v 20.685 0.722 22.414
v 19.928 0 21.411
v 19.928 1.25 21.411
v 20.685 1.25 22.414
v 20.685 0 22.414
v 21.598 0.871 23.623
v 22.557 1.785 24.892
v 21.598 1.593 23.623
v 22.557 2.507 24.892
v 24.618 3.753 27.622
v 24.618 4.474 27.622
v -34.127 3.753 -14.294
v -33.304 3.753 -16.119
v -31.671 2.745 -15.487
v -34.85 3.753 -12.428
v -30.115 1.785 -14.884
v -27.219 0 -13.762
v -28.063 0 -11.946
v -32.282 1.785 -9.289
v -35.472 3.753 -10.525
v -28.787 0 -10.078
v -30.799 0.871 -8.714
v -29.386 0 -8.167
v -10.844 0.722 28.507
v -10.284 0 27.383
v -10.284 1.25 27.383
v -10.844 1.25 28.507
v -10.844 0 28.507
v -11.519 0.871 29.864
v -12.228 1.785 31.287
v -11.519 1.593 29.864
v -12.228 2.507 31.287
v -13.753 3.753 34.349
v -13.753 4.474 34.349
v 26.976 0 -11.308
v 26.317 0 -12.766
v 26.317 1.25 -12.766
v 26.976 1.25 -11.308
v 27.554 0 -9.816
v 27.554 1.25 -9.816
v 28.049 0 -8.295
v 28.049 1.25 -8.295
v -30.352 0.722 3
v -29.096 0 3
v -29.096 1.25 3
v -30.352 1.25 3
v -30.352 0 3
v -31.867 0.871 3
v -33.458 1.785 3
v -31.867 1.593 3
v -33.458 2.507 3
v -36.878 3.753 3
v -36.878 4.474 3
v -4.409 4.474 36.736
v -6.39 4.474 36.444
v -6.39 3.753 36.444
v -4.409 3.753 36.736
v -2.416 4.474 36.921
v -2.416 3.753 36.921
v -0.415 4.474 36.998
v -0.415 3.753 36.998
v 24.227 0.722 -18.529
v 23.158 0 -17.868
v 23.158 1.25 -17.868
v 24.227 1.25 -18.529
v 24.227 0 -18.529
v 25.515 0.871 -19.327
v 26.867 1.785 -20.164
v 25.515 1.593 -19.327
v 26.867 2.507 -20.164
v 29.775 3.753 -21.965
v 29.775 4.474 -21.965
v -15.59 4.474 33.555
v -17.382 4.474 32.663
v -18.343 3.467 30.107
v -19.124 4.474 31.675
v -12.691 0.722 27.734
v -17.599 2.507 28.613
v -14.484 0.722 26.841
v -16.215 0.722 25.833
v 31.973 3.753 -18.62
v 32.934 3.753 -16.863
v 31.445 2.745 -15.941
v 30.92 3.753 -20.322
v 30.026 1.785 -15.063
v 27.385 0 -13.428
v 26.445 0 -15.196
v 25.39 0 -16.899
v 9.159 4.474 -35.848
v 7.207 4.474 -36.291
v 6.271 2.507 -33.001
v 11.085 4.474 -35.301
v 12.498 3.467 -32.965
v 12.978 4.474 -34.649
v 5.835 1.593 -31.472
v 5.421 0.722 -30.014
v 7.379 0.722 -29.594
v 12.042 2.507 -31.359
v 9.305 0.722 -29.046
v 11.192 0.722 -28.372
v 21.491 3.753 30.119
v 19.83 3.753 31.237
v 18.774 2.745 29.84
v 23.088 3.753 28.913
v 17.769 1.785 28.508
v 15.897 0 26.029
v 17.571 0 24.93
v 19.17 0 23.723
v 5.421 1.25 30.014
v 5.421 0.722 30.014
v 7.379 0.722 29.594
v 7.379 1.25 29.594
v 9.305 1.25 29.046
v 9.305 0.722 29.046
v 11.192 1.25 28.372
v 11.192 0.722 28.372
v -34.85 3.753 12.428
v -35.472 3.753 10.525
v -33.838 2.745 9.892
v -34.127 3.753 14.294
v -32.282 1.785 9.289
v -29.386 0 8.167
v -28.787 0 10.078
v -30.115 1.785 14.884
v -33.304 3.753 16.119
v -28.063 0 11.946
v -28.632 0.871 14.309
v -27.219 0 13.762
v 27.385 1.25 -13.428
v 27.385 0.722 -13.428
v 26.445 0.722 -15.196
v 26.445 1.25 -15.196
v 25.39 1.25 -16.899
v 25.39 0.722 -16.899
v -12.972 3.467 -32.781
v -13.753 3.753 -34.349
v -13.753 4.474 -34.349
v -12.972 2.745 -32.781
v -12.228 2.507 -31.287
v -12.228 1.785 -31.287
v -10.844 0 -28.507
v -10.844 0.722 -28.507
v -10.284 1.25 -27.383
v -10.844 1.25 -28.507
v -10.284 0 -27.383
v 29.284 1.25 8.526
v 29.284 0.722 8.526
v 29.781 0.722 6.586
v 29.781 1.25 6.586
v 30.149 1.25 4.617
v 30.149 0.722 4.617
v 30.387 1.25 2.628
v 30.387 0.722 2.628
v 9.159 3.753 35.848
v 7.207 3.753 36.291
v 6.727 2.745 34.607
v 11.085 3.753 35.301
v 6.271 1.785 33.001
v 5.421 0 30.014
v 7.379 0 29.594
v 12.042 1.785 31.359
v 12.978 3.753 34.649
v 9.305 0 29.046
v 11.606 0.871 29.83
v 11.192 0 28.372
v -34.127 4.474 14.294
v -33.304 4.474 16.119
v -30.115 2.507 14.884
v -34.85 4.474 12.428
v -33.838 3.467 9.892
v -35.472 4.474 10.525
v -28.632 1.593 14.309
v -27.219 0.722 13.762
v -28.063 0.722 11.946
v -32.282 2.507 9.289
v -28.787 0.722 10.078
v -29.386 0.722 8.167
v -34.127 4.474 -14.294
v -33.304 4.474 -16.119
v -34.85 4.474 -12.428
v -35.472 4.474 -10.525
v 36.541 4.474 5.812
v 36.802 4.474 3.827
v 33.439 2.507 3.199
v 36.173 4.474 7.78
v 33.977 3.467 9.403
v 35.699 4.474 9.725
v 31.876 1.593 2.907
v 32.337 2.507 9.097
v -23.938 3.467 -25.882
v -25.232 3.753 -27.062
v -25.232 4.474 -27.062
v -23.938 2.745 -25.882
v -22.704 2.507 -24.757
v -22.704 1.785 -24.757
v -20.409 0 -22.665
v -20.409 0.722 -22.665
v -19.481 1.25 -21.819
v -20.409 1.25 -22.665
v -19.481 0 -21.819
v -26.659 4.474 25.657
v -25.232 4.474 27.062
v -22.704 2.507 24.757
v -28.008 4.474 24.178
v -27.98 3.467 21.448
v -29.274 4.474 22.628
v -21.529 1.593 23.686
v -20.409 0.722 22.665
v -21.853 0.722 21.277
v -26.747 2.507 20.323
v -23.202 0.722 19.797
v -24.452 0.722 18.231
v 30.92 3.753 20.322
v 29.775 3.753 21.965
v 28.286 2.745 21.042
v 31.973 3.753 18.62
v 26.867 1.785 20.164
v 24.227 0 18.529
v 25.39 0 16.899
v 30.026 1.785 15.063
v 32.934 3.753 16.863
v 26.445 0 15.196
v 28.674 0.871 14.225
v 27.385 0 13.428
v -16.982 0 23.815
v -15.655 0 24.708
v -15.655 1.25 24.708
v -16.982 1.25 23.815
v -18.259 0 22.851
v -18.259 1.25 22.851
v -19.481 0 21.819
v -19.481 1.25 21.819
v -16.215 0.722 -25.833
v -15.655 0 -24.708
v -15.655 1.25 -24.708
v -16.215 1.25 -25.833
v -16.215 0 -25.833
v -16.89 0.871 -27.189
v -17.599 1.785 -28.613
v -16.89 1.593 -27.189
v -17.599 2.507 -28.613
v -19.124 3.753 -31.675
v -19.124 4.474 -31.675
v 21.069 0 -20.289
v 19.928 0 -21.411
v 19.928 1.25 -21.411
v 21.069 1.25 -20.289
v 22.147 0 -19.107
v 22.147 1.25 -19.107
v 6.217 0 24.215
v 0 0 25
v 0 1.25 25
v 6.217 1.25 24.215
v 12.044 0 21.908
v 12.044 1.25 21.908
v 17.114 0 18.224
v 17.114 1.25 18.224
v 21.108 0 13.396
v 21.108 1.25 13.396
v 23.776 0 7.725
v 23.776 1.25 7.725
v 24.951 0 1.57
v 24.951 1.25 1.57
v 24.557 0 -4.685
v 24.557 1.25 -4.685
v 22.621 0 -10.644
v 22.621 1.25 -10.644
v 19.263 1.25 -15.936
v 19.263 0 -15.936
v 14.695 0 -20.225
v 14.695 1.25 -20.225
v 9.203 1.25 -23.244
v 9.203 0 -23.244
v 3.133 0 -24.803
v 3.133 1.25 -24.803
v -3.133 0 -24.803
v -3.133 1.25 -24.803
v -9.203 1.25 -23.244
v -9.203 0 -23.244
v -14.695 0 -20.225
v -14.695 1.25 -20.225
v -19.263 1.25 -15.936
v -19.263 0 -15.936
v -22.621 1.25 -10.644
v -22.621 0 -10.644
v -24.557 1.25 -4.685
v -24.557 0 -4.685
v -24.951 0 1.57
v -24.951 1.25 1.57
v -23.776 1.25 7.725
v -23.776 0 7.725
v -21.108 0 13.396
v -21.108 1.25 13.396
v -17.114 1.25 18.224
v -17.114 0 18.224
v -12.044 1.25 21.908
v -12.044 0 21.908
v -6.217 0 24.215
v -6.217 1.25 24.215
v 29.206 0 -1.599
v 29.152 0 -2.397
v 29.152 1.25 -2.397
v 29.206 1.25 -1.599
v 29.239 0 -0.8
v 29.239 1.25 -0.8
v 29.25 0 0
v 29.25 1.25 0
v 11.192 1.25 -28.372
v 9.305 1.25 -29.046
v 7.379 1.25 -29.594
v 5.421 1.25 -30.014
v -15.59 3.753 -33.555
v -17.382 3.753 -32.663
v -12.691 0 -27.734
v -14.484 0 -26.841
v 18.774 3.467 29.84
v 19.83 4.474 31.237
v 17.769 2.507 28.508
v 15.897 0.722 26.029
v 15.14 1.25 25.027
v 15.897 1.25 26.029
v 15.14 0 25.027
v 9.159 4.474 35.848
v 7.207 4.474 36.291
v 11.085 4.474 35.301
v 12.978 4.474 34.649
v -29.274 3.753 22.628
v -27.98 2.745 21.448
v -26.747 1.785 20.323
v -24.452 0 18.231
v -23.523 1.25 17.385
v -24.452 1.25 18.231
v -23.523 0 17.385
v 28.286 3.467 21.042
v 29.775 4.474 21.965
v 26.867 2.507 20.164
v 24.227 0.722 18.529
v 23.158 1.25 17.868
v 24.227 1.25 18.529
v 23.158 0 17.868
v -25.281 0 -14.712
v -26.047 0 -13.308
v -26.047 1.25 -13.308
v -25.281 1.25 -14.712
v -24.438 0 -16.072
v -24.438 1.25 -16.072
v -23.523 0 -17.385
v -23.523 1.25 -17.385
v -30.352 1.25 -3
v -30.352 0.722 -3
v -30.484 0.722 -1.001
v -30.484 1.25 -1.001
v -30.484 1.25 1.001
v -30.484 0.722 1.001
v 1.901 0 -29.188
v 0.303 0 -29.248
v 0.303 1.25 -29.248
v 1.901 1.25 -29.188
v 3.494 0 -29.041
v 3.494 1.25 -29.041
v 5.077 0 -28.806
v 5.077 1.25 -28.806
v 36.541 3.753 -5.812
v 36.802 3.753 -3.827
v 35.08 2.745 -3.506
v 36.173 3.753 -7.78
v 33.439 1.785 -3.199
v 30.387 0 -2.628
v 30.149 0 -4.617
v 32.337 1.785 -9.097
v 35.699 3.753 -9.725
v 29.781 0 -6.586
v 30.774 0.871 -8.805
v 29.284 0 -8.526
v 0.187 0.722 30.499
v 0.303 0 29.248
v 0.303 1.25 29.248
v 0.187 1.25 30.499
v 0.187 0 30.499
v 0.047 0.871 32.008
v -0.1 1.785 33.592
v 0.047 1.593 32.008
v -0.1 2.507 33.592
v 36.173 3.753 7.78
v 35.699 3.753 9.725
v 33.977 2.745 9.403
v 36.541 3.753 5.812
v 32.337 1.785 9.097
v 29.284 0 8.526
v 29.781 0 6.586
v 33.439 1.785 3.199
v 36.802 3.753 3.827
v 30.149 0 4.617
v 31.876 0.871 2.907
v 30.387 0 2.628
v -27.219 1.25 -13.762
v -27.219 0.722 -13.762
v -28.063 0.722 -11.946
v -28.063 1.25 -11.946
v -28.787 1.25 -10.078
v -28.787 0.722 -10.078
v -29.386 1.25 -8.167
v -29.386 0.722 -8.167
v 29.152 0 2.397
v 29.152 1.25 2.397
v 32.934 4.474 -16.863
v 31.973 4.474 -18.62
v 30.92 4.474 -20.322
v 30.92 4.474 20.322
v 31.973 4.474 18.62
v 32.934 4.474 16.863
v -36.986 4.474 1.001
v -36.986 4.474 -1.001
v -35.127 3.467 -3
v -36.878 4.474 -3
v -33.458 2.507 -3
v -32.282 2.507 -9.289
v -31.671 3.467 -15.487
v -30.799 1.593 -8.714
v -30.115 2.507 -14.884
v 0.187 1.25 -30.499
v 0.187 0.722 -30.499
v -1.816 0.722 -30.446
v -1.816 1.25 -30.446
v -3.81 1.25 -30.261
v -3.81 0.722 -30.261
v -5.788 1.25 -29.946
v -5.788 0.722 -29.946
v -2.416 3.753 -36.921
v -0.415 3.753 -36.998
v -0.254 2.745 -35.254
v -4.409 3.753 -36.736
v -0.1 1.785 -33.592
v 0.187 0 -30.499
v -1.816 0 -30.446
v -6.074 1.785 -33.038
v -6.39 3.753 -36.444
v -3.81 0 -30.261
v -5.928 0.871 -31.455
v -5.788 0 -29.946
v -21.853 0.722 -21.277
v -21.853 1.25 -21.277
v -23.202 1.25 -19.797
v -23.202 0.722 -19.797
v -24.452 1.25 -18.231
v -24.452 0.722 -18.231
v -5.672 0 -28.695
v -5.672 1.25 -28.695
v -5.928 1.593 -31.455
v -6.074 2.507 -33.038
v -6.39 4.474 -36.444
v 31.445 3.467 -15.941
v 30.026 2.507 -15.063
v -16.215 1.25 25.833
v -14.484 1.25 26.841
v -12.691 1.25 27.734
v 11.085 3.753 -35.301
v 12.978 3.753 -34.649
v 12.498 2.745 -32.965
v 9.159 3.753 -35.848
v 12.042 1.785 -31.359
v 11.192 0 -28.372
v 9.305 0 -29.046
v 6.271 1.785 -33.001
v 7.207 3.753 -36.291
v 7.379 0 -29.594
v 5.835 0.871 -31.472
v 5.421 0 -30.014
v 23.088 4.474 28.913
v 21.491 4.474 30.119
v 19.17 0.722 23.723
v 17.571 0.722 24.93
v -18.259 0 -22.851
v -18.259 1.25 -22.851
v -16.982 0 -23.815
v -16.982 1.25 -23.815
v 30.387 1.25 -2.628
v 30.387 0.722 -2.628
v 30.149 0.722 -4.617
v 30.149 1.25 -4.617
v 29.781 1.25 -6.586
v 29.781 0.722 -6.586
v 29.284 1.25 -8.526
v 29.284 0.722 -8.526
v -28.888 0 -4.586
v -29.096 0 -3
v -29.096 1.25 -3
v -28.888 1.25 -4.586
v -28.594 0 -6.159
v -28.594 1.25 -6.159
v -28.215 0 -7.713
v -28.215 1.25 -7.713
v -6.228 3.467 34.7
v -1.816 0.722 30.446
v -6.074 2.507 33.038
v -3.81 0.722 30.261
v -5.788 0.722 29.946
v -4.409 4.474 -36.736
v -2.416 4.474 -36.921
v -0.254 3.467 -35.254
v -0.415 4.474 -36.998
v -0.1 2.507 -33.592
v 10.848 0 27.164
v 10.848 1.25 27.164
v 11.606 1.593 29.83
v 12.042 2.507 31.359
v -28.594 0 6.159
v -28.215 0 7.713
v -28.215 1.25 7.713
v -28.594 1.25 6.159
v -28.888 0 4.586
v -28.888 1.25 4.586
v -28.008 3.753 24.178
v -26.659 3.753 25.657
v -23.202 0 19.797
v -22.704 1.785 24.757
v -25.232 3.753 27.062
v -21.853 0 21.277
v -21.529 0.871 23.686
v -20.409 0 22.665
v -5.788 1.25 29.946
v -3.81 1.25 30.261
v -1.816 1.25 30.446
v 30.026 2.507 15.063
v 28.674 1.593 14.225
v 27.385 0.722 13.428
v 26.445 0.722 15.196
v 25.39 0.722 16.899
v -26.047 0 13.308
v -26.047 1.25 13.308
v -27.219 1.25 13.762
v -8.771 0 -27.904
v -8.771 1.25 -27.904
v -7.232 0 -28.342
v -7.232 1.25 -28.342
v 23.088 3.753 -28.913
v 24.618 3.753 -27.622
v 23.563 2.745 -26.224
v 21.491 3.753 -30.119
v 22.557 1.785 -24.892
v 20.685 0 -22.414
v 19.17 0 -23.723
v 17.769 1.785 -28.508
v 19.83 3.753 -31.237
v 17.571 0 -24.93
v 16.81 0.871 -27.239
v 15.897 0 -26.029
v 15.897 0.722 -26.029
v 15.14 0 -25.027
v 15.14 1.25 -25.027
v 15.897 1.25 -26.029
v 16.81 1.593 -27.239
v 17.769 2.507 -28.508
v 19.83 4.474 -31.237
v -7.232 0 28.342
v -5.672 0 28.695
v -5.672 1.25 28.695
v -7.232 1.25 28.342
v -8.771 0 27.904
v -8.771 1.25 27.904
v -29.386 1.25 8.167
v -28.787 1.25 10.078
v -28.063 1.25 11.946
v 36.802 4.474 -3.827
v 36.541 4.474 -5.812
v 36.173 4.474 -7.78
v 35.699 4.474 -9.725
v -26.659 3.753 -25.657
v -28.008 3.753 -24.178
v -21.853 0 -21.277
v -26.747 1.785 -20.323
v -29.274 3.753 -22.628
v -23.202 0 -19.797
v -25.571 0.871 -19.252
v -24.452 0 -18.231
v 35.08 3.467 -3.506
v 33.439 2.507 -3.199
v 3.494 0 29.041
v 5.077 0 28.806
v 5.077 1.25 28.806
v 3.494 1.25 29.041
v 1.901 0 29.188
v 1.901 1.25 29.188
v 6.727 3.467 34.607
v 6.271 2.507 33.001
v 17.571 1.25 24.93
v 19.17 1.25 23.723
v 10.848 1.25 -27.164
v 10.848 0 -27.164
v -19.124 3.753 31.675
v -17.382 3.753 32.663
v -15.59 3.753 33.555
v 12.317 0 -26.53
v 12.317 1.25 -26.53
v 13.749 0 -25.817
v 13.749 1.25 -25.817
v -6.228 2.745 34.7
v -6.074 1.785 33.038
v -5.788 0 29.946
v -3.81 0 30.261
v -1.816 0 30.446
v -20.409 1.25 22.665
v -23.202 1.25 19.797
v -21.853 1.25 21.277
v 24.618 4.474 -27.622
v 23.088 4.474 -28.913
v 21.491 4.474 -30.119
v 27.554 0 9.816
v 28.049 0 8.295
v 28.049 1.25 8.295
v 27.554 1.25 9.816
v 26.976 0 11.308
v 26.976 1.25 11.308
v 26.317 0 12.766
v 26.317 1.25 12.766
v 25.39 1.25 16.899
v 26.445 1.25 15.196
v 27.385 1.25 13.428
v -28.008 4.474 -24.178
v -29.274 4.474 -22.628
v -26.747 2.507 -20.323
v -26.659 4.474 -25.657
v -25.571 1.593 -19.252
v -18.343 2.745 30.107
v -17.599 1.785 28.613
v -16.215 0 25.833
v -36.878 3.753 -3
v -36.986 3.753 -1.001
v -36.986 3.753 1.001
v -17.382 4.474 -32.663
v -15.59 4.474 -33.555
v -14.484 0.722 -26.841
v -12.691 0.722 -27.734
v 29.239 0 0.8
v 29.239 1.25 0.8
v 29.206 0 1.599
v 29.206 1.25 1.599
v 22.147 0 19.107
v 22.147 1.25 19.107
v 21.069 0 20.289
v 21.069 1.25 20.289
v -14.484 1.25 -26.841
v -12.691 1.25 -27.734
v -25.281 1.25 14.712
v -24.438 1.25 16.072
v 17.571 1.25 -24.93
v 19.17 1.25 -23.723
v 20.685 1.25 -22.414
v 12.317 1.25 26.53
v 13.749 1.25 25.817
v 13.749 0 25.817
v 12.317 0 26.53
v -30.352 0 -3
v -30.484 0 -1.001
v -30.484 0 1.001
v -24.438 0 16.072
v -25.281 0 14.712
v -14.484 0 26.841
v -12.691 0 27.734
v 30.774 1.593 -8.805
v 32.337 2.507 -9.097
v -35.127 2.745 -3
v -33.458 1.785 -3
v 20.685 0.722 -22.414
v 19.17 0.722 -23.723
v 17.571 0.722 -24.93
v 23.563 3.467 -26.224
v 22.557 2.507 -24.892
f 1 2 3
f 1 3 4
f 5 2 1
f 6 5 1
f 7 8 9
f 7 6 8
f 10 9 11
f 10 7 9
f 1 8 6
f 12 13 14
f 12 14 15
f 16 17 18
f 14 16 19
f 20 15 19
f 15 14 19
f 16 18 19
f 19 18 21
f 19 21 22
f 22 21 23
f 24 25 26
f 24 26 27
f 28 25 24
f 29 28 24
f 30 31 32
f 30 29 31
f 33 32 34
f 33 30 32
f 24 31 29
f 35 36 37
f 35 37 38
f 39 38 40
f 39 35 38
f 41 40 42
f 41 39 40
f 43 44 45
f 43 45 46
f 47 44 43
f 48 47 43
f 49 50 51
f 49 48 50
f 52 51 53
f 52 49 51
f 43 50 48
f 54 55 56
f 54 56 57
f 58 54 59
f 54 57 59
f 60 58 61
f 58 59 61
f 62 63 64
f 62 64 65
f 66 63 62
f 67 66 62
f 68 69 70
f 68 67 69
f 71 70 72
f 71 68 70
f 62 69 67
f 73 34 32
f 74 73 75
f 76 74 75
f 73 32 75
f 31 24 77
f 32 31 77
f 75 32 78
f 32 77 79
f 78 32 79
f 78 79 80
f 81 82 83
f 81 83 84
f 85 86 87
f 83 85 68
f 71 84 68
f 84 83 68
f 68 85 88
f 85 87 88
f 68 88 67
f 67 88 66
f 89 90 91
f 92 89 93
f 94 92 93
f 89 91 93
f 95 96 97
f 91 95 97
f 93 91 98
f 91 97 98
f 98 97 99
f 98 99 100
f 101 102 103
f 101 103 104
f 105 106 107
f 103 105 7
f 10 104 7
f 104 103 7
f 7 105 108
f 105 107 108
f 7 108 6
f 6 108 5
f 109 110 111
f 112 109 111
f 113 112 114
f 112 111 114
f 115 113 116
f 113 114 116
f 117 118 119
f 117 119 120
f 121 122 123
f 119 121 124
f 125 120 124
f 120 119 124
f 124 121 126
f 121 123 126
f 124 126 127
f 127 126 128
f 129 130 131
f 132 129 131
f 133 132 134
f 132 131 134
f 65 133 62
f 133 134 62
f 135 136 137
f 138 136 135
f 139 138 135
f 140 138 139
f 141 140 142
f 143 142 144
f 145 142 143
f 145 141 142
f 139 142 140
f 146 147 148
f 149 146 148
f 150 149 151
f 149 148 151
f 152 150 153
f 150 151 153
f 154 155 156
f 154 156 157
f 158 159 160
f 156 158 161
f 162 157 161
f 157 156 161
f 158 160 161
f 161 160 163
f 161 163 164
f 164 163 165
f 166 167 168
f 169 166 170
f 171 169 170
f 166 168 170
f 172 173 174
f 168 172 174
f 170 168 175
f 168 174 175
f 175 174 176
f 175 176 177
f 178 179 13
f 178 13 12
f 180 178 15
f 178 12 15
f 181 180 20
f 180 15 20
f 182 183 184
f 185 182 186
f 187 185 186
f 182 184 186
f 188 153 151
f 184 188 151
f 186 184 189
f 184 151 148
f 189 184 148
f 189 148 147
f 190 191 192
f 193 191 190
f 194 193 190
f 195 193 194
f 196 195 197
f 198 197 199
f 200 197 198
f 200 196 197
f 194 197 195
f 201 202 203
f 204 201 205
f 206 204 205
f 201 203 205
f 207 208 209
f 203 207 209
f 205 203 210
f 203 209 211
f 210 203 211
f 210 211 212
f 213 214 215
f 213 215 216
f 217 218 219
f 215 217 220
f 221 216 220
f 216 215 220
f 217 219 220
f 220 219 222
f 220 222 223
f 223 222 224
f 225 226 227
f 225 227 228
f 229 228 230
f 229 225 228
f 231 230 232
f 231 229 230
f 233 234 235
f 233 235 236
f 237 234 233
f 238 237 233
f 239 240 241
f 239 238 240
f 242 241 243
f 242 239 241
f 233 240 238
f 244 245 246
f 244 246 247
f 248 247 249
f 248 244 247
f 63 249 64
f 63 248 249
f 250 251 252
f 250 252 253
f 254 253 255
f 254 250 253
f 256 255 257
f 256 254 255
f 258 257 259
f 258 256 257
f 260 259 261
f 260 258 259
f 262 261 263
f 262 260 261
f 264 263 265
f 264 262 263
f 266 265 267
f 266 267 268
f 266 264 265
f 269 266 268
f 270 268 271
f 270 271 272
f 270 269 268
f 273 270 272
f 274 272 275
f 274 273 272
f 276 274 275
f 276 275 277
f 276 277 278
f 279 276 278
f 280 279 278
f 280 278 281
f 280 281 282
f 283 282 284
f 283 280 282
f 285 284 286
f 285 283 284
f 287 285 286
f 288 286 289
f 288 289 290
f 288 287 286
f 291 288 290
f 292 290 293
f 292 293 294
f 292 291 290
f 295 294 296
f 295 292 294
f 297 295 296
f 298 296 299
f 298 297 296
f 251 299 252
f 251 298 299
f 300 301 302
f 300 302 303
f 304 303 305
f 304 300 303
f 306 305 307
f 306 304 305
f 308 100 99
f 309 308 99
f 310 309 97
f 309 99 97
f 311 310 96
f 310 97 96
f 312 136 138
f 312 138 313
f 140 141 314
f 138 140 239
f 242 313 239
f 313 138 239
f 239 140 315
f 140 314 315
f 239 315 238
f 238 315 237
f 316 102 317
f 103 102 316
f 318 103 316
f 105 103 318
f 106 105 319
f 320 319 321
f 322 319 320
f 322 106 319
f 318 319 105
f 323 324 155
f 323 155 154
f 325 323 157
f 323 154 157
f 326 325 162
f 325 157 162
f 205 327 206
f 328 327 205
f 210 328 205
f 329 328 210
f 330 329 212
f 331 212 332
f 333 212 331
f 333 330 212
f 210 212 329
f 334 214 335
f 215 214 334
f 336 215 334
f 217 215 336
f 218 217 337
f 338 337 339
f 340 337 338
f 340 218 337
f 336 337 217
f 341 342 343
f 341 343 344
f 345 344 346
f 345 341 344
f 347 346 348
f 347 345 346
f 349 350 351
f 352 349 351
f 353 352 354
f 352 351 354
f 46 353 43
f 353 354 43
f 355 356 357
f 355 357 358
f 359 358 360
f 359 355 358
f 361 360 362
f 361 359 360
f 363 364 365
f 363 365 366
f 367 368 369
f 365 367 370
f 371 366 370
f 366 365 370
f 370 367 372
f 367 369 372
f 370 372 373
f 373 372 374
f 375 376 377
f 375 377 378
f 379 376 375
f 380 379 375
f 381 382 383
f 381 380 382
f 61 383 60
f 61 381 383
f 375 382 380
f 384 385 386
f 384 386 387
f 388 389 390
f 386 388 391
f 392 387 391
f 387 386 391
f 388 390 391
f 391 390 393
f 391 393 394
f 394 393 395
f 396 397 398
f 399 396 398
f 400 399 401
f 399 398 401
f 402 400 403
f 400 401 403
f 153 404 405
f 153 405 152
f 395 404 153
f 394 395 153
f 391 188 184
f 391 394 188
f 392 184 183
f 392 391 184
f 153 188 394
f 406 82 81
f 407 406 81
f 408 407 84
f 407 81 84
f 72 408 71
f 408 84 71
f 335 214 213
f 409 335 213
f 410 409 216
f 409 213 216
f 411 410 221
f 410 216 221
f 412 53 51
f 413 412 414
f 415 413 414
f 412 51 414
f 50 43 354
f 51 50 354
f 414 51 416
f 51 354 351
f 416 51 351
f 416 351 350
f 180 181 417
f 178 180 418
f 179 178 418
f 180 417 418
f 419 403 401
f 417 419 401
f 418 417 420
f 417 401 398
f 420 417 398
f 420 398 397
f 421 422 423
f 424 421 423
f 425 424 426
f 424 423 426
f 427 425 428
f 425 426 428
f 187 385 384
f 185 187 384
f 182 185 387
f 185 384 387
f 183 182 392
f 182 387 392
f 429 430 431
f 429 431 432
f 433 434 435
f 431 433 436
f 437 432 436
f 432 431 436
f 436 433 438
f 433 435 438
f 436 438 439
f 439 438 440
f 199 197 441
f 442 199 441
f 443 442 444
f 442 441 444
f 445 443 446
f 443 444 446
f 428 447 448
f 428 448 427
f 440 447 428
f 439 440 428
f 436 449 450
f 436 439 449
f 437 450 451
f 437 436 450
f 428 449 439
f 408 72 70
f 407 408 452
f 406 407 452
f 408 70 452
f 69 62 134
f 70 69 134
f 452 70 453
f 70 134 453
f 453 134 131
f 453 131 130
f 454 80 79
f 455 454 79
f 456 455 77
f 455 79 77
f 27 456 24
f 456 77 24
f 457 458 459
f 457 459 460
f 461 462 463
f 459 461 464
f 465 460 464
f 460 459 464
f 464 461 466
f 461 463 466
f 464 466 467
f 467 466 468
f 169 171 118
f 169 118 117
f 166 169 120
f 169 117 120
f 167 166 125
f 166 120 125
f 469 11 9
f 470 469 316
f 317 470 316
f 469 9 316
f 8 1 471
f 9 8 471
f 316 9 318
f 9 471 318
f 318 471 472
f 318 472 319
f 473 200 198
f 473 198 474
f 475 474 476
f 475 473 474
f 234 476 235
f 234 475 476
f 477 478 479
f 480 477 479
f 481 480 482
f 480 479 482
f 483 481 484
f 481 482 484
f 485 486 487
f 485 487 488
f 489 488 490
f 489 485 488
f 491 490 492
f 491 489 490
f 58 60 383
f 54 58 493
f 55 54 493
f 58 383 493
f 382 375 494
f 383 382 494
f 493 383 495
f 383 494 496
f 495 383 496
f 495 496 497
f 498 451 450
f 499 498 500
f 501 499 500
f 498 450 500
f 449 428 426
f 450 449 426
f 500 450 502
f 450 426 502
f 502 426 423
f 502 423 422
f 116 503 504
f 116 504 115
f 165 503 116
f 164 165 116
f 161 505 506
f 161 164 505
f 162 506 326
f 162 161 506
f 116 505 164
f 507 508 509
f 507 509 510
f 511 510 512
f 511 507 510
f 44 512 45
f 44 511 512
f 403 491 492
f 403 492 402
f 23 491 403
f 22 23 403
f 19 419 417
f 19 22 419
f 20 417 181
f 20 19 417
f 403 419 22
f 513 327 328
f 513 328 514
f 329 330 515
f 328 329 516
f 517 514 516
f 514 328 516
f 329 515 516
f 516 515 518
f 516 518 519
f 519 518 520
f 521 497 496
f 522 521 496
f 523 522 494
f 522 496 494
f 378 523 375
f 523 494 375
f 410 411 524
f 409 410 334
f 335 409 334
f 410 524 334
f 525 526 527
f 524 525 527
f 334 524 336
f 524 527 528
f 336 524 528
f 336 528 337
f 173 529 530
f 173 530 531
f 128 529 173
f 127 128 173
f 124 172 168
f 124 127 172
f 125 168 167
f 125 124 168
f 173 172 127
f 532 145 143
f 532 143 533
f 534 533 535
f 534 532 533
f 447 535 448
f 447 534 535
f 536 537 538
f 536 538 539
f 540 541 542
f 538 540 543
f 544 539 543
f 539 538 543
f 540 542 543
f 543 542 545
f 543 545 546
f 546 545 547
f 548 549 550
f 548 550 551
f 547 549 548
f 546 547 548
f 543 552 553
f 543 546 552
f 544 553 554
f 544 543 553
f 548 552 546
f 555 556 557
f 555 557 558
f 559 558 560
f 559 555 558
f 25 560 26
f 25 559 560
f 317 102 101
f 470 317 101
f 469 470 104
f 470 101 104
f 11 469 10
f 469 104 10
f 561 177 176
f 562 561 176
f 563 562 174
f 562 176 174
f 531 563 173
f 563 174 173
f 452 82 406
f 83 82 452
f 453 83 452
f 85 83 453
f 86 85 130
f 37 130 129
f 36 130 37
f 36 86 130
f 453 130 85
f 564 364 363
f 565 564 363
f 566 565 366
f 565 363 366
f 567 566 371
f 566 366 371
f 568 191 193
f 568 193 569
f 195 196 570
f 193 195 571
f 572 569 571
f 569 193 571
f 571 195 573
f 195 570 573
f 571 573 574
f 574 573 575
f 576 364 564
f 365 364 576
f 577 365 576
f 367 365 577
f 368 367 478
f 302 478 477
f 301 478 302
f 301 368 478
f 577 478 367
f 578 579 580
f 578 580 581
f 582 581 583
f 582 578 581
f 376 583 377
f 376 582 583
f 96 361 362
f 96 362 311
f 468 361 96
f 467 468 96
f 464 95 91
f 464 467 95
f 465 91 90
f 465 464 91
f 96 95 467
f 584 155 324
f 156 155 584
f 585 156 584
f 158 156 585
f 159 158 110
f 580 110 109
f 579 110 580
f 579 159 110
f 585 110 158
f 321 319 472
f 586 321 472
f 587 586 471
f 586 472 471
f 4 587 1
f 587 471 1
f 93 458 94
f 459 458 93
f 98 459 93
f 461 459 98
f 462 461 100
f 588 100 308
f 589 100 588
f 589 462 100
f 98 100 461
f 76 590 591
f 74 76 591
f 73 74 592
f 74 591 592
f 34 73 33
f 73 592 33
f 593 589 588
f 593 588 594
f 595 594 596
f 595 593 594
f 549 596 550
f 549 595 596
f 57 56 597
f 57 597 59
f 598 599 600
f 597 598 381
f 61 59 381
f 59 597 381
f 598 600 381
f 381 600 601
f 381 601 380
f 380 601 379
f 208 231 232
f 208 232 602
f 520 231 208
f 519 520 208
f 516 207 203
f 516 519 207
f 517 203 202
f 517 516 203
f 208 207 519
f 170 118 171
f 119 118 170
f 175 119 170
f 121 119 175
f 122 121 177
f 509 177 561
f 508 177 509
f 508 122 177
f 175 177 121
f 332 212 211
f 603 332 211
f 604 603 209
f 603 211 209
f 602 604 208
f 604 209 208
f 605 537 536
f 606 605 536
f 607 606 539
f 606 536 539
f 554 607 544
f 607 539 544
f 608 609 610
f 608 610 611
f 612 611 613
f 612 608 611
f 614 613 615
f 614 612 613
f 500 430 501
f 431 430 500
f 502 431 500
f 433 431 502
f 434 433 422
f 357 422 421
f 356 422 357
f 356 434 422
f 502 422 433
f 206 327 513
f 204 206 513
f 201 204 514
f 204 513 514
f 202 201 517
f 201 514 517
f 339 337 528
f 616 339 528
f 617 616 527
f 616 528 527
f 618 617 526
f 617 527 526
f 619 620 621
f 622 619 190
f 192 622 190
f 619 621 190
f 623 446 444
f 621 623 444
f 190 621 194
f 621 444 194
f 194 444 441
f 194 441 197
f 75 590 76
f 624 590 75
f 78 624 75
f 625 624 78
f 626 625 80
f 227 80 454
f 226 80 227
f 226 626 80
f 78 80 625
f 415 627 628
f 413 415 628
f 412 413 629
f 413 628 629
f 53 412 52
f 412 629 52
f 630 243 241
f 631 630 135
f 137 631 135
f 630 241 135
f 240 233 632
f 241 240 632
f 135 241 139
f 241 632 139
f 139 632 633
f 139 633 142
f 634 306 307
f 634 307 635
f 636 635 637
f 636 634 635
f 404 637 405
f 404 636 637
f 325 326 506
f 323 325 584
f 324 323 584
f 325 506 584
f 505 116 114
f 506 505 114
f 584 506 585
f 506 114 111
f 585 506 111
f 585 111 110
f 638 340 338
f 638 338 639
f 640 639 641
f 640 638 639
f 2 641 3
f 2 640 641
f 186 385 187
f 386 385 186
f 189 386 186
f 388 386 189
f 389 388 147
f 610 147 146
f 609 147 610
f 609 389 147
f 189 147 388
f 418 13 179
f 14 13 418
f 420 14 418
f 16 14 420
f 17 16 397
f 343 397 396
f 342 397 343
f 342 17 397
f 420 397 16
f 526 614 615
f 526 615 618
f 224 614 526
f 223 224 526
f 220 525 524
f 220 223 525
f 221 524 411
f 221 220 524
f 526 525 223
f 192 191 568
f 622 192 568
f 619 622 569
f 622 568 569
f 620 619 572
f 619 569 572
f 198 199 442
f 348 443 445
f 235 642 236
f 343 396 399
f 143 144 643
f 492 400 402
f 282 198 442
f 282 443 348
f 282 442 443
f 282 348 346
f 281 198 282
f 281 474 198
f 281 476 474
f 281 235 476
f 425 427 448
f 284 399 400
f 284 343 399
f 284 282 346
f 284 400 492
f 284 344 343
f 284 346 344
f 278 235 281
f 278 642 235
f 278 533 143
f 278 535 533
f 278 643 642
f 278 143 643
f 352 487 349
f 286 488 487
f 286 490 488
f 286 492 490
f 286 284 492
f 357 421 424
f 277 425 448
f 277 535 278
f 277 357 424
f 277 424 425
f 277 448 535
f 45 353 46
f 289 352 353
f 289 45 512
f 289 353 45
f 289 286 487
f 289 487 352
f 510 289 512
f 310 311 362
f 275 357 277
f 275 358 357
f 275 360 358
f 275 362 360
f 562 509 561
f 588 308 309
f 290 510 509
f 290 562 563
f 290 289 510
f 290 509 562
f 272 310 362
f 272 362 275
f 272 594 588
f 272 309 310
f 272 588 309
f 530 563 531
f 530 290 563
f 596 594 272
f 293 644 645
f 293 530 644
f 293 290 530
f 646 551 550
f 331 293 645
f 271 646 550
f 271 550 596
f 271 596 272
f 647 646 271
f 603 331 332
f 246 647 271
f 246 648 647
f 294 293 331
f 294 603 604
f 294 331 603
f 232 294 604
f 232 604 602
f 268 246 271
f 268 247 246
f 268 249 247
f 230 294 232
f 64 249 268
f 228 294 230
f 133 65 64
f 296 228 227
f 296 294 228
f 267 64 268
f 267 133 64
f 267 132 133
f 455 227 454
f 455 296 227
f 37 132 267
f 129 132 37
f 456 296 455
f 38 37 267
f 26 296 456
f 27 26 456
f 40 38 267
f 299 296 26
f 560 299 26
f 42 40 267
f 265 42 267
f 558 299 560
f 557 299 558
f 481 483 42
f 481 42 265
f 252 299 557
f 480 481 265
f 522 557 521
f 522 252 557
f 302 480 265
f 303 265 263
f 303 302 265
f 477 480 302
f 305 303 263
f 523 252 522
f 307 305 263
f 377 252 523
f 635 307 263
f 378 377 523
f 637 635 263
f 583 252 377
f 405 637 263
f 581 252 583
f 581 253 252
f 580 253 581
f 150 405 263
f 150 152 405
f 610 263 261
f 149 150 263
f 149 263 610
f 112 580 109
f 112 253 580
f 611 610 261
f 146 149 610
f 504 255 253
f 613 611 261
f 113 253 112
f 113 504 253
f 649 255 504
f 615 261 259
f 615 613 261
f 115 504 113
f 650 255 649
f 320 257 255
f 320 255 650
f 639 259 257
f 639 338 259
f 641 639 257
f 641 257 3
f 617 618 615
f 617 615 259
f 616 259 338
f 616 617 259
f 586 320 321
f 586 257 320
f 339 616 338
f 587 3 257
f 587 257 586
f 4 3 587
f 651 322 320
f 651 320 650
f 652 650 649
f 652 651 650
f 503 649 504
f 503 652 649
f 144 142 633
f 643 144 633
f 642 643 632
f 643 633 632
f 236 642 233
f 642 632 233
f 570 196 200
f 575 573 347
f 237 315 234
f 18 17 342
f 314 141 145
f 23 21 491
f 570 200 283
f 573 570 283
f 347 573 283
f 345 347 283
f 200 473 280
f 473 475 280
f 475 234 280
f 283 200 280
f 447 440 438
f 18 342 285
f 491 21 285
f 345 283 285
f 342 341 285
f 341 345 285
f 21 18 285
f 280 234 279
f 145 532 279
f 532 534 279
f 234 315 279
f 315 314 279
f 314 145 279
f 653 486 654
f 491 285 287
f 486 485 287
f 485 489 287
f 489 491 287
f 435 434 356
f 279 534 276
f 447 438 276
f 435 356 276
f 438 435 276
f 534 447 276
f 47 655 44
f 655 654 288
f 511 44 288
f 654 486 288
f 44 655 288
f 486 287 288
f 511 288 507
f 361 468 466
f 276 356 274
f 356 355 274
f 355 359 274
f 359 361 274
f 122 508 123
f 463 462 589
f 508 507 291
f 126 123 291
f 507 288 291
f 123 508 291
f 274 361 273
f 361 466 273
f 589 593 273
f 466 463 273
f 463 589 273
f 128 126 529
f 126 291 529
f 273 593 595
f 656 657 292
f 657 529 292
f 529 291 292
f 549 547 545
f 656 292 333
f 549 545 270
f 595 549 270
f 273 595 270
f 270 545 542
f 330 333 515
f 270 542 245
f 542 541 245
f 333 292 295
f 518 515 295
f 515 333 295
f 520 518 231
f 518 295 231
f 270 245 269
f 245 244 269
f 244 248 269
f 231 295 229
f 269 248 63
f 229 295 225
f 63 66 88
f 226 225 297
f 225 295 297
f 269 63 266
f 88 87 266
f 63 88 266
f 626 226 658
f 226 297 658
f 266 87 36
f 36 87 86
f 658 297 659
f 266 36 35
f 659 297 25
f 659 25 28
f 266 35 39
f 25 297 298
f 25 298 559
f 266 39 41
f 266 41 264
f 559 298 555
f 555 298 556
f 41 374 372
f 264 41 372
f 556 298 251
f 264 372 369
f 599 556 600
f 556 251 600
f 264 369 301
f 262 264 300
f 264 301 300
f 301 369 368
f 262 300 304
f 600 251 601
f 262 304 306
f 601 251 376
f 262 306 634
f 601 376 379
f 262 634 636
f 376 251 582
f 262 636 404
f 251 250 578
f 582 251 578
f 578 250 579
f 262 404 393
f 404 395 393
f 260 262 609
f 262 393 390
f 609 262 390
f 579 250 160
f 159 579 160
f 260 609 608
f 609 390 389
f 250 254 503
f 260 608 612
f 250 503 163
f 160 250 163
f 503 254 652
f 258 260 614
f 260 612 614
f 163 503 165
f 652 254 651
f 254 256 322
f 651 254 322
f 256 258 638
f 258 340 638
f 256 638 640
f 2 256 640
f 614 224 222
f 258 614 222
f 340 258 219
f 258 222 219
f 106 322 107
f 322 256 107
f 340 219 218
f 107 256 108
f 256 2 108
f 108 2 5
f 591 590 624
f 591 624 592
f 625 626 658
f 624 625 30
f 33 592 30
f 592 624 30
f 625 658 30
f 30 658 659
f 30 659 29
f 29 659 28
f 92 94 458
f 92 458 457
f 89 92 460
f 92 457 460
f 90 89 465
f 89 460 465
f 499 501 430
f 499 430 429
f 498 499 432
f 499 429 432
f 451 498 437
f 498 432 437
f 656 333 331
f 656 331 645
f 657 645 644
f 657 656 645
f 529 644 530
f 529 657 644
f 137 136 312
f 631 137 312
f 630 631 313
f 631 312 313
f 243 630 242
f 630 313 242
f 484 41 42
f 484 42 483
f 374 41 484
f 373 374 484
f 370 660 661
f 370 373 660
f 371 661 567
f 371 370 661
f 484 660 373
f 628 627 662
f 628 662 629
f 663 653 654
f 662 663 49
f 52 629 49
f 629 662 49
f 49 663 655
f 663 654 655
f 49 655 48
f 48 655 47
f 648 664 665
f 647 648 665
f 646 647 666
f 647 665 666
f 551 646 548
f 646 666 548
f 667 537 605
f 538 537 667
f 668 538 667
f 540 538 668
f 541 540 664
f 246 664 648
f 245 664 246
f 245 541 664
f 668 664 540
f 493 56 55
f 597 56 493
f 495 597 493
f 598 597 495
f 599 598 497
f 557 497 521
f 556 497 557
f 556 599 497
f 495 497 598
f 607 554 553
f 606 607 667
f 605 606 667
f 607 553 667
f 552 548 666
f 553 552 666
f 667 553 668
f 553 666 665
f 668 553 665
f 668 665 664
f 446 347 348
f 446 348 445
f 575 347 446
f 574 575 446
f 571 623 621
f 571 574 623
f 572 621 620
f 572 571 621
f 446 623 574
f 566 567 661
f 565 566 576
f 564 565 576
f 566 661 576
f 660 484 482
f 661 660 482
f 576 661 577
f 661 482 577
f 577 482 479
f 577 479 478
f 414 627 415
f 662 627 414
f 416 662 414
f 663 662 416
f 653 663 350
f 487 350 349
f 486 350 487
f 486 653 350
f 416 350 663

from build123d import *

# Parameters (mm, degrees)
SKETCH1_R           = 30.5
SKETCH1_R_2         = 25
BOSS_EXTRUDE1_DEPTH = 1.25
SKETCH2_R           = 30.5
BOSS_EXTRUDE2_DEPTH = 30
BOSS_EXTRUDE2_DRAFT = -60
SKETCH3_R           = 29.25
CUT_EXTRUDE1_DEPTH  = 30
CUT_EXTRUDE1_DRAFT  = 60
SKETCH4_R           = 94.674694241
SKETCH4_R_2         = 37
CUT_EXTRUDE2_DEPTH  = 30
SKETCH7_R           = 30.5
SKETCH7_R_2         = 25
BOSS_EXTRUDE4_DEPTH = 1.25
CUT_EXTRUDE3_DEPTH  = 30


with BuildPart() as part:
    # Sketch1 → Boss-Extrude1 (new body)
    with BuildSketch(Plane(origin=(0, 0, 0), x_dir=(1, 0, 0), z_dir=(0, 1, 0))):
        with Locations(Location((0, 0, 0), (0, 0, 270))):
            Circle(SKETCH1_R)
        with Locations(Location((0, 0, 0), (0, 0, 270))):
            Circle(SKETCH1_R_2, mode=Mode.SUBTRACT)
    extrude(amount=BOSS_EXTRUDE1_DEPTH)


with BuildPart() as boss_extrude2_tool:
    # Sketch2 → Boss-Extrude2 (with draft: the straight prism first)
    with BuildSketch(Plane(origin=(0, 0, 0), x_dir=(1, 0, 0), z_dir=(0, 1, 0))):
        Circle(SKETCH2_R)
    extrude(amount=BOSS_EXTRUDE2_DEPTH)
    # Boss-Extrude2: the draft: its side faces are tilted about the plane it starts from
    boss_extrude2_sides = [boss_extrude2_tool.faces().sort_by_distance(p)[0] for p in [
        (-30.5, 15, 0),
    ]]
    draft(boss_extrude2_sides, Plane(origin=(0, 0, 0), x_dir=(1, 0, 0), z_dir=(0, 1, 0)), BOSS_EXTRUDE2_DRAFT)


with BuildPart() as part_1:
    add(part.part)

    # Boss-Extrude2: add boss_extrude2_tool
    add(boss_extrude2_tool.part)


with BuildPart() as cut_extrude1_tool:
    # Sketch3 → Cut-Extrude1 (with draft: the straight prism first)
    with BuildSketch(Plane.XZ):
        Circle(SKETCH3_R)
    extrude(amount=-CUT_EXTRUDE1_DEPTH)
    # Cut-Extrude1: the draft: its side faces are tilted about the plane it starts from
    cut_extrude1_sides = [cut_extrude1_tool.faces().sort_by_distance(p)[0] for p in [
        (-29.25, 15, 0),
    ]]
    draft(cut_extrude1_sides, Plane.XZ, CUT_EXTRUDE1_DRAFT)


with BuildPart() as part_2:
    add(part_1.part)

    # Cut-Extrude1: cut by cut_extrude1_tool
    add(cut_extrude1_tool.part, mode=Mode.SUBTRACT)

    # Sketch4 → Cut-Extrude2 (cut)
    with BuildSketch(Plane(origin=(0, 0, 0), x_dir=(1, 0, 0), z_dir=(0, 1, 0))):
        Circle(SKETCH4_R)
        with Locations(Location((0, 0, 0), (0, 0, 270))):
            Circle(SKETCH4_R_2, mode=Mode.SUBTRACT)
    extrude(amount=CUT_EXTRUDE2_DEPTH, mode=Mode.SUBTRACT)

    # Sketch7 → Boss-Extrude4 (add)
    with BuildSketch(Plane(origin=(0, 0, 0), x_dir=(1, 0, 0), z_dir=(0, 1, 0))):
        with Locations(Location((0, 0, 0), (0, 0, 270))):
            Circle(SKETCH7_R)
        with Locations(Location((0, 0, 0), (0, 0, 270))):
            Circle(SKETCH7_R_2, mode=Mode.SUBTRACT)
    extrude(amount=BOSS_EXTRUDE4_DEPTH)

    # Sketch5 → Cut-Extrude3 (cut)
    with BuildSketch(Plane(origin=(0, 0, 0), x_dir=(1, 0, 0), z_dir=(0, 1, 0))):
        with BuildLine():
            Line((-36.878177829, 3), (-29.095747112, 3))
            ThreePointArc((-29.095747112, 3), (-28.751963166, 5.374673396), (-28.214701174, 7.713179477))
            Line((-28.214701174, 7.713179477), (-35.471601695, 10.524517717))
            ThreePointArc((-35.471601695, 10.524517717), (-36.370004688, 6.798732159), (-36.878177829, 3))
        make_face()
        with BuildLine():
            Line((-33.304151698, 16.119351093), (-26.047251177, 13.308012854))
            ThreePointArc((-26.047251177, 13.308012854), (-24.86885122, 15.398140764), (-23.5231035, 17.384651326))
            Line((-23.5231035, 17.384651326), (-29.274389198, 22.627640997))
            ThreePointArc((-29.274389198, 22.627640997), (-31.458034022, 19.477990026), (-33.304151698, 16.119351093))
        make_face()
        with BuildLine():
            Line((-25.232215336, 27.061694501), (-19.480929638, 21.81870483))
            ThreePointArc((-19.480929638, 21.81870483), (-17.627063114, 23.342003898), (-15.654580352, 24.708229682))
            Line((-15.654580352, 24.708229682), (-19.123508224, 31.674775977))
            ThreePointArc((-19.123508224, 31.674775977), (-22.297481546, 29.526637409), (-25.232215336, 27.061694501))
        make_face()
        with BuildLine():
            Line((-13.752528476, 34.349206112), (-10.283600604, 27.382659816))
            ThreePointArc((-10.283600604, 27.382659816), (-8.00464246, 28.133400063), (-5.671819382, 28.694824706))
            Line((-5.671819382, 28.694824706), (-6.389891497, 36.444056946))
            ThreePointArc((-6.389891497, 36.444056946), (-10.125530633, 35.587548797), (-13.752528476, 34.349206112))
        make_face()
        with BuildLine():
            Line((-0.415486439, 36.997667102), (0.302585676, 29.248434863))
            ThreePointArc((0.302585676, 29.248434863), (2.698849514, 29.125224657), (5.076952224, 28.80602465))
            Line((5.076952224, 28.80602465), (7.206715484, 36.29136608))
            ThreePointArc((7.206715484, 36.29136608), (3.4139293, 36.842164523), (-0.415486439, 36.997667102))
        make_face()
        with BuildLine():
            Line((12.977669343, 34.649388139), (10.847906083, 27.164046709))
            ThreePointArc((10.847906083, 27.164046709), (13.037846906, 26.183526272), (15.140053299, 25.026811345))
            Line((15.140053299, 25.026811345), (19.830015605, 31.237325128))
            ThreePointArc((19.830015605, 31.237325128), (16.492319164, 33.12104178), (12.977669343, 34.649388139))
        make_face()
        with BuildLine():
            Line((24.618118968, 27.621517309), (19.928156663, 21.411003527))
            ThreePointArc((19.928156663, 21.411003527), (21.616010829, 19.705597577), (23.158406283, 17.86758849))
            Line((23.158406283, 17.86758849), (29.775162236, 21.964510325))
            ThreePointArc((29.775162236, 21.964510325), (27.343329937, 24.926738815), (24.618118968, 27.621517309))
        make_face()
        with BuildLine():
            Line((32.933755213, 16.86320751), (26.31699926, 12.766285675))
            ThreePointArc((26.31699926, 12.766285675), (27.27481271, 10.566318736), (28.049088173, 8.295248801))
            Line((28.049088173, 8.295248801), (35.699008218, 9.725266693))
            ThreePointArc((35.699008218, 9.725266693), (34.501472488, 13.365941649), (32.933755213, 16.86320751))
        make_face()
        with BuildLine():
            ThreePointArc((29.25, 0), (29.225385963, -1.199714668), (29.15158528, -2.397410203))
            Line((29.15158528, -2.397410203), (36.801505325, -3.827428095))
            ThreePointArc((36.801505325, -3.827428095), (36.950343009, -1.916285858), (37, 0))
            ThreePointArc((37, 0), (36.950343009, 1.916285858), (36.801505325, 3.827428095))
            Line((36.801505325, 3.827428095), (29.15158528, 2.397410203))
            ThreePointArc((29.15158528, 2.397410203), (29.225385963, 1.199714668), (29.25, 0))
        make_face()
        with BuildLine():
            ThreePointArc((28.049088173, -8.295248801), (27.27481271, -10.566318736), (26.31699926, -12.766285675))
            Line((26.31699926, -12.766285675), (32.933755213, -16.86320751))
            ThreePointArc((32.933755213, -16.86320751), (34.501472488, -13.365941649), (35.699008218, -9.725266693))
            Line((35.699008218, -9.725266693), (28.049088173, -8.295248801))
        make_face()
        with BuildLine():
            ThreePointArc((23.158406283, -17.86758849), (21.616010829, -19.705597577), (19.928156663, -21.411003527))
            Line((19.928156663, -21.411003527), (24.618118968, -27.621517309))
            ThreePointArc((24.618118968, -27.621517309), (27.343329937, -24.926738815), (29.775162236, -21.964510325))
            Line((29.775162236, -21.964510325), (23.158406283, -17.86758849))
        make_face()
        with BuildLine():
            ThreePointArc((15.140053299, -25.026811345), (13.037846906, -26.183526272), (10.847906083, -27.164046709))
            Line((10.847906083, -27.164046709), (12.977669343, -34.649388139))
            ThreePointArc((12.977669343, -34.649388139), (16.492319164, -33.12104178), (19.830015605, -31.237325128))
            Line((19.830015605, -31.237325128), (15.140053299, -25.026811345))
        make_face()
        with BuildLine():
            ThreePointArc((5.076952224, -28.80602465), (2.698849514, -29.125224657), (0.302585676, -29.248434863))
            Line((0.302585676, -29.248434863), (-0.415486439, -36.997667102))
            ThreePointArc((-0.415486439, -36.997667102), (3.4139293, -36.842164523), (7.206715484, -36.29136608))
            Line((7.206715484, -36.29136608), (5.076952224, -28.80602465))
        make_face()
        with BuildLine():
            ThreePointArc((-5.671819382, -28.694824706), (-8.00464246, -28.133400063), (-10.283600604, -27.382659816))
            Line((-10.283600604, -27.382659816), (-13.752528476, -34.349206112))
            ThreePointArc((-13.752528476, -34.349206112), (-10.125530633, -35.587548797), (-6.389891497, -36.444056946))
            Line((-6.389891497, -36.444056946), (-5.671819382, -28.694824706))
        make_face()
        with BuildLine():
            ThreePointArc((-28.214701174, -7.713179477), (-28.751963166, -5.374673396), (-29.095747112, -3))
            Line((-29.095747112, -3), (-36.878177829, -3))
            ThreePointArc((-36.878177829, -3), (-36.370004688, -6.798732159), (-35.471601695, -10.524517717))
            Line((-35.471601695, -10.524517717), (-28.214701174, -7.713179477))
        make_face()
        with BuildLine():
            ThreePointArc((-23.5231035, -17.384651326), (-24.86885122, -15.398140764), (-26.047251177, -13.308012854))
            Line((-26.047251177, -13.308012854), (-33.304151698, -16.119351093))
            ThreePointArc((-33.304151698, -16.119351093), (-31.458034022, -19.477990026), (-29.274389198, -22.627640997))
            Line((-29.274389198, -22.627640997), (-23.5231035, -17.384651326))
        make_face()
        with BuildLine():
            ThreePointArc((-15.654580352, -24.708229682), (-17.627063114, -23.342003898), (-19.480929638, -21.81870483))
            Line((-19.480929638, -21.81870483), (-25.232215336, -27.061694501))
            ThreePointArc((-25.232215336, -27.061694501), (-22.297481546, -29.526637409), (-19.123508224, -31.674775977))
            Line((-19.123508224, -31.674775977), (-15.654580352, -24.708229682))
        make_face()
    extrude(amount=CUT_EXTRUDE3_DEPTH, mode=Mode.SUBTRACT)


solid = part_2.part
